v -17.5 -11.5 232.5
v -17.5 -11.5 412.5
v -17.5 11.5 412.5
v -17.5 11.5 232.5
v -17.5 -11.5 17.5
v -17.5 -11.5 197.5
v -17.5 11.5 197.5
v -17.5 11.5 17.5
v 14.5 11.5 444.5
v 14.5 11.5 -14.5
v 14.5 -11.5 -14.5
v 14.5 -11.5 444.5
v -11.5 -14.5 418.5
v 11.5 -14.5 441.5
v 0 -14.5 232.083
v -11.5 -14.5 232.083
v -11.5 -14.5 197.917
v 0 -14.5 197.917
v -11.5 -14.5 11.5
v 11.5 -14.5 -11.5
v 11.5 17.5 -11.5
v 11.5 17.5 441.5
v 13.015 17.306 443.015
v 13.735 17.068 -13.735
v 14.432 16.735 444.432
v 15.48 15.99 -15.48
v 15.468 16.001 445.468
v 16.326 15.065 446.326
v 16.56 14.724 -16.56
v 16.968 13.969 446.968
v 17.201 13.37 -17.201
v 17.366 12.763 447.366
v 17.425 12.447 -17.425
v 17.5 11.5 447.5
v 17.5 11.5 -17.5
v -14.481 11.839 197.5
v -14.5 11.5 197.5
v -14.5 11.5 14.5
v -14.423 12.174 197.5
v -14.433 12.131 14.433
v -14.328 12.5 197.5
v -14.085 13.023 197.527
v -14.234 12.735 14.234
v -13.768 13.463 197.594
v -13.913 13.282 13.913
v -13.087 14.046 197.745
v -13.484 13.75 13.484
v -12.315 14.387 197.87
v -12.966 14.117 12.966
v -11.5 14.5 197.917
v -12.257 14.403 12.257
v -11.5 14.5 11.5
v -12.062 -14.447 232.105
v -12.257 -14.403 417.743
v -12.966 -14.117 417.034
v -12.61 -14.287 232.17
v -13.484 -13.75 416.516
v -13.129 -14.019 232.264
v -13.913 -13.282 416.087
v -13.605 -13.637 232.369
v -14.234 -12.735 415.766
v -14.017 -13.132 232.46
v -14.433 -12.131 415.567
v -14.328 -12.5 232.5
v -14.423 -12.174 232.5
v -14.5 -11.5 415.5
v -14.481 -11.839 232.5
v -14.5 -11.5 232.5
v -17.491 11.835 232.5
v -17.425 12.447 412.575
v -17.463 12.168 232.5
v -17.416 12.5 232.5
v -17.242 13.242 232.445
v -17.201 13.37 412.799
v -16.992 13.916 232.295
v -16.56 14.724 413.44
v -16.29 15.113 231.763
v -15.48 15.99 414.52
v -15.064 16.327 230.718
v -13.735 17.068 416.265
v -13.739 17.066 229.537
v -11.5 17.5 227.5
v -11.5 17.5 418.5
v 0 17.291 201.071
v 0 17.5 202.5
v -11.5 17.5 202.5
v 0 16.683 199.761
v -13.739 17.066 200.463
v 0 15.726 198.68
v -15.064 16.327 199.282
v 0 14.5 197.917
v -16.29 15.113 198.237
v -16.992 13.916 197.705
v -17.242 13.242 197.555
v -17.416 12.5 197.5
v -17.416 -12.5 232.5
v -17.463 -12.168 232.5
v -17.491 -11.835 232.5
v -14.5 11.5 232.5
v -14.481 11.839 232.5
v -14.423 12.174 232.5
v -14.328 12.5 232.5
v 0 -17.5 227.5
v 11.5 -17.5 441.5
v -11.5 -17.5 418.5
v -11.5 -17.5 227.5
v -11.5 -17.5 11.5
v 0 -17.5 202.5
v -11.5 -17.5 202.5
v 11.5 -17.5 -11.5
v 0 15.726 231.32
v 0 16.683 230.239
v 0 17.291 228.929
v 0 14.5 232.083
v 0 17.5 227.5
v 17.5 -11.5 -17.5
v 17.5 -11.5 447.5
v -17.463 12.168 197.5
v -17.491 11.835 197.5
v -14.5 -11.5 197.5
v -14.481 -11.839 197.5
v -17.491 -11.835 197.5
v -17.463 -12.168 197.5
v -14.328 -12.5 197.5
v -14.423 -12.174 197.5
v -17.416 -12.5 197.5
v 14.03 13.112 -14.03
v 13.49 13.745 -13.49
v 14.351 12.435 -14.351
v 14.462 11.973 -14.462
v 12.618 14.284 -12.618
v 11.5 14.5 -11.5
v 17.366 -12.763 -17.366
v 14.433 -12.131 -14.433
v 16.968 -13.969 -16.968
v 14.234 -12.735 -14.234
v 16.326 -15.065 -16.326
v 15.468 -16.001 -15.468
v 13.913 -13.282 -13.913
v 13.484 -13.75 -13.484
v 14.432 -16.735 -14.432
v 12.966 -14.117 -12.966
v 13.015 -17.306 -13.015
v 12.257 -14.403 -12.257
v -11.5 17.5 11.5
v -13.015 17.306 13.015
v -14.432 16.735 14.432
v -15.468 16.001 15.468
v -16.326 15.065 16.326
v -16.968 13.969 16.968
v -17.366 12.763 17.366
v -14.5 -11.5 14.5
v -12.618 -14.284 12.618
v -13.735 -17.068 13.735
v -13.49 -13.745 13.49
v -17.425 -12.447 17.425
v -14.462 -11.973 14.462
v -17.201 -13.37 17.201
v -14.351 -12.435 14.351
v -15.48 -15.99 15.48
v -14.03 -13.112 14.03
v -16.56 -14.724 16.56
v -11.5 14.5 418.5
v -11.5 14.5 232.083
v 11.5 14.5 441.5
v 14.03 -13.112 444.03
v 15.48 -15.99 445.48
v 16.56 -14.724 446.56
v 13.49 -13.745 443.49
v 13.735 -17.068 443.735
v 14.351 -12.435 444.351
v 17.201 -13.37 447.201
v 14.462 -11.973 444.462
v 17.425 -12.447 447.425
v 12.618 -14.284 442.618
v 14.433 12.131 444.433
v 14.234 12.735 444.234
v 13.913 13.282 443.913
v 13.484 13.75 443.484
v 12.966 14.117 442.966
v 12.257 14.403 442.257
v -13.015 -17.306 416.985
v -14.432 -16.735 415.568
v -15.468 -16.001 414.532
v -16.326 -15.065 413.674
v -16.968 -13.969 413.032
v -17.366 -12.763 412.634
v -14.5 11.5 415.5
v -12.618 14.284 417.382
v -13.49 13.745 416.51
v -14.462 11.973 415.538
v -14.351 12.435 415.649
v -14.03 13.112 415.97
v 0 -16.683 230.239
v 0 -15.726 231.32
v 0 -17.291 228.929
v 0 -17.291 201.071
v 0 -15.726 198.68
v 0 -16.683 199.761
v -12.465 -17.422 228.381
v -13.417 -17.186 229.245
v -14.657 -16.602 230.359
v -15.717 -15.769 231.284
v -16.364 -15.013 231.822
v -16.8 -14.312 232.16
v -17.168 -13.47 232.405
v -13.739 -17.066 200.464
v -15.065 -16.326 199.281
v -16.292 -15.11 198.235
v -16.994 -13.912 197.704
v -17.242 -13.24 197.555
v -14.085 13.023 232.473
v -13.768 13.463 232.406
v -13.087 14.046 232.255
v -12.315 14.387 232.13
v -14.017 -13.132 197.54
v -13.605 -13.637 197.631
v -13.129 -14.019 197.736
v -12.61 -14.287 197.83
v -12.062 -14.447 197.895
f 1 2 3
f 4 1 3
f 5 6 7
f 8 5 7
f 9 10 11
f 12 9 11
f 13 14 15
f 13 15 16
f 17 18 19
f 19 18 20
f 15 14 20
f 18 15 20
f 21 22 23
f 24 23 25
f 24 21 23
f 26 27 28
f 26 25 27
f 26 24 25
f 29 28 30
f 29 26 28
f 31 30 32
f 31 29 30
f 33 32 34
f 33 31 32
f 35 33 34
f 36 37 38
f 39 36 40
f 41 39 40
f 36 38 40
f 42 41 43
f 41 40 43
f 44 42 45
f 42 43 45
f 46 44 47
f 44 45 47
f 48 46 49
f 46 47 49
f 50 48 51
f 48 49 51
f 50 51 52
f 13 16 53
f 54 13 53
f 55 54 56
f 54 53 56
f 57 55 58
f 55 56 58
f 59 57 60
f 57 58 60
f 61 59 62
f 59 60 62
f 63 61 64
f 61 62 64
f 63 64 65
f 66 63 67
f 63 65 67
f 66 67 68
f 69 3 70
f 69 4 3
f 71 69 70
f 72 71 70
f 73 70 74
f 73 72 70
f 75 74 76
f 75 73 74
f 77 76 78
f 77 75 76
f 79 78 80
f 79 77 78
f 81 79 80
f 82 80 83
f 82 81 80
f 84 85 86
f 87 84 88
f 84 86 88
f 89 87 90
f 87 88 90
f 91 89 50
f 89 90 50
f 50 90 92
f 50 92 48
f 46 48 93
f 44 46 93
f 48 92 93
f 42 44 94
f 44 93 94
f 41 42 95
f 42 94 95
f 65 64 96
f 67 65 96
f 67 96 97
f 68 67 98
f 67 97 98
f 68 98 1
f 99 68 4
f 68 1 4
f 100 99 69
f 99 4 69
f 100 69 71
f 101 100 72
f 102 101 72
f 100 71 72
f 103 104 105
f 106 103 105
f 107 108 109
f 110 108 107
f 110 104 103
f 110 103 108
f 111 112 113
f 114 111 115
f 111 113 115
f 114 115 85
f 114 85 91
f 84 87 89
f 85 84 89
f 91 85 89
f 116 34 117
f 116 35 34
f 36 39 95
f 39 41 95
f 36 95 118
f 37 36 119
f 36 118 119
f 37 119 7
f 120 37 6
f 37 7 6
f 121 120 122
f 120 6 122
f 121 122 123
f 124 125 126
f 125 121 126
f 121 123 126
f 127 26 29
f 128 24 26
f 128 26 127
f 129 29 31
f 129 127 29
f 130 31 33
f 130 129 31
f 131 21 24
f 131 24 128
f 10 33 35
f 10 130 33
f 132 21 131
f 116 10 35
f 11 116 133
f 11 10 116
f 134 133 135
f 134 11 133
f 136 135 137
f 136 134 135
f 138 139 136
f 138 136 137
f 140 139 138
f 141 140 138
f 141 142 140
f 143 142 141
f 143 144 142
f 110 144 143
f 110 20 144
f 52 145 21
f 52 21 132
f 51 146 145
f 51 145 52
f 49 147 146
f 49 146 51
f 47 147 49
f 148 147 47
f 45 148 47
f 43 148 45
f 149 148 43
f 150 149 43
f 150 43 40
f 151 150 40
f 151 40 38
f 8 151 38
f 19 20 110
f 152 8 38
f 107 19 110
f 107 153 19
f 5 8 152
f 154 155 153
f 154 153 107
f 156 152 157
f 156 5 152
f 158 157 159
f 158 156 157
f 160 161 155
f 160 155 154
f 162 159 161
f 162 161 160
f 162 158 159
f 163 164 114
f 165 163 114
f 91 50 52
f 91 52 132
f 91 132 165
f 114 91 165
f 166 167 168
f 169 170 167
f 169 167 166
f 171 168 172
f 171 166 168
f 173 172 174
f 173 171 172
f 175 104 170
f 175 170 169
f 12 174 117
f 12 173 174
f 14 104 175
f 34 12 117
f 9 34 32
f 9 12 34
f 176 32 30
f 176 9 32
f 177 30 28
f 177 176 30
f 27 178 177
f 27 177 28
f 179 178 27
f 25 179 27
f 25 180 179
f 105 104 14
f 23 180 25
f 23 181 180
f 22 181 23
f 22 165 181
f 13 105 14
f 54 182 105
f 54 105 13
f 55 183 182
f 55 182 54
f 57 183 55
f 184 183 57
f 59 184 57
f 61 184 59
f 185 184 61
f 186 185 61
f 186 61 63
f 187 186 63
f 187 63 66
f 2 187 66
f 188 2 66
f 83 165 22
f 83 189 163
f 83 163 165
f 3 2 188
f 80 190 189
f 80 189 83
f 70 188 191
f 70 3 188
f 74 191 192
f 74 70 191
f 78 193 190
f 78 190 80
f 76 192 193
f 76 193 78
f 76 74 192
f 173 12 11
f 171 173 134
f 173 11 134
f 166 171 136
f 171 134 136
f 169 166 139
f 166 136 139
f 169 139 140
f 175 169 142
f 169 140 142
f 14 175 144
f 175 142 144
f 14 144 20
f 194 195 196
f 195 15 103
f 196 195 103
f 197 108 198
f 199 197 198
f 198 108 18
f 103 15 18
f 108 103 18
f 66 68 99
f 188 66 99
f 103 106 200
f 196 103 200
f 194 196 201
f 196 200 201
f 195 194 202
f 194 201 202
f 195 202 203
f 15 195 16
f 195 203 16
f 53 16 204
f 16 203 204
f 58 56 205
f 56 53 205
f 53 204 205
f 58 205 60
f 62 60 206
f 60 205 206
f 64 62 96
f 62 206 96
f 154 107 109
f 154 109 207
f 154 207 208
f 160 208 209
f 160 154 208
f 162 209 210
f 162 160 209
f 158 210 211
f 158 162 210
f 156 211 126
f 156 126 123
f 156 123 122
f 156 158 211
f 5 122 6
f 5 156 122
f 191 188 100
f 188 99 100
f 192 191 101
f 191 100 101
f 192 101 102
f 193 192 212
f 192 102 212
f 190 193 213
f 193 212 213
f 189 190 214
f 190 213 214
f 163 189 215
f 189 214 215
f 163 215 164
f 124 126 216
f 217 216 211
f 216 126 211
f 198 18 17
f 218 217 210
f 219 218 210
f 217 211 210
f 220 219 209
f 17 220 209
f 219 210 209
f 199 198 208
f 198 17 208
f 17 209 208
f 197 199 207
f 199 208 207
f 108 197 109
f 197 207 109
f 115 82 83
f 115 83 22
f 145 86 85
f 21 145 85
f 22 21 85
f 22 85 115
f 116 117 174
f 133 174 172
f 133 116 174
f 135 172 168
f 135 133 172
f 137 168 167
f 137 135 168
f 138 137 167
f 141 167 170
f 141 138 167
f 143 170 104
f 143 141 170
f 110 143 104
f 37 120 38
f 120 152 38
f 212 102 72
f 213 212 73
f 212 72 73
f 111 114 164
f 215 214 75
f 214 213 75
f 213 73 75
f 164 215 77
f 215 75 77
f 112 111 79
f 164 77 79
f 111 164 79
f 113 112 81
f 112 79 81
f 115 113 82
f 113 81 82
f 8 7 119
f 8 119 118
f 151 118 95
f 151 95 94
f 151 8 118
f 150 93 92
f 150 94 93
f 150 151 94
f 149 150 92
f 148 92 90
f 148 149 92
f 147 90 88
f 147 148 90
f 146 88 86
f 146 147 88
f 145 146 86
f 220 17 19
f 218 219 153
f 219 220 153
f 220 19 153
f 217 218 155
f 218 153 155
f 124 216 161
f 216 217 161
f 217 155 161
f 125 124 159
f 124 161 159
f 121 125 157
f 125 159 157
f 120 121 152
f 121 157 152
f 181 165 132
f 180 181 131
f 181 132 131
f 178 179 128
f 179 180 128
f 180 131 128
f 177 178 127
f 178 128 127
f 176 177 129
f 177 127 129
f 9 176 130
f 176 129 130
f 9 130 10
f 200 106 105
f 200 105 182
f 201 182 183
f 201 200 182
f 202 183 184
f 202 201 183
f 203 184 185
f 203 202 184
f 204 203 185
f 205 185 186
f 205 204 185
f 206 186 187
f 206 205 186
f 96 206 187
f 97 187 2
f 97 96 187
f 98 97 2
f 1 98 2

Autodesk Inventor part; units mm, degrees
ref_plane "Start plane" through (0, 0, -17.5) normal (0, 0, 1) x (1, 0, 0)
ref_plane "End plane" through (0, 0, 447.5) normal (0, 0, 1) x (1, 0, 0)
sketch "Sketch" plane through (0, 0, 0) normal (0, 0, 1) x (1, 0, 0)
  line L0 (-17.5, -11.5) -> (-17.5, 11.5)
  line L1 (-11.5, 17.5) -> (11.5, 17.5)
  line L2 (17.5, 11.5) -> (17.5, -11.5)
  line L3 (11.5, -17.5) -> (-11.5, -17.5)
  arc A0 (-17.5, -11.5) -> (-11.5, -17.5) centre (-11.5, -11.5) ccw
  arc A1 (-11.5, 17.5) -> (-17.5, 11.5) centre (-11.5, 11.5) ccw
  arc A2 (17.5, 11.5) -> (11.5, 17.5) centre (11.5, 11.5) ccw
  arc A3 (11.5, -17.5) -> (17.5, -11.5) centre (11.5, -11.5) ccw
  arc A4 (-11.5, 14.5) -> (-14.5, 11.5) centre (-11.5, 11.5) ccw
  line L4 (-11.5, 14.5) -> (11.5, 14.5)
  arc A5 (14.5, 11.5) -> (11.5, 14.5) centre (11.5, 11.5) ccw
  line L5 (14.5, 11.5) -> (14.5, -11.5)
  arc A6 (11.5, -14.5) -> (14.5, -11.5) centre (11.5, -11.5) ccw
  line L6 (11.5, -14.5) -> (-11.5, -14.5)
  arc A7 (-14.5, -11.5) -> (-11.5, -14.5) centre (-11.5, -11.5) ccw
  line L7 (-14.5, -11.5) -> (-14.5, 11.5)
  line L8 (0, 25.4278) -> (0, -25.4278) construction
  line L9 (-25.4278, 0) -> (25.4278, 0) construction
  dimension "d7" = 6
  dimension "d10" = 35
  dimension "d11" = 35
  dimension "d12" = 3
  dimension "d15" = 17.5
  dimension "d16" = 17.5
extrude "Body" add sketch "Sketch" along normal up to surface (465 mm away) from surface at -17.5
sketch "Sketch3" plane through (0, 0, 0) normal (0, 0, 1) x (1, 0, 0)
  line L0 (0, 0) -> (10, 0)
ref_plane "Work Plane3" through (0, 0, 0) normal (0, -1, 0) x (1, 0, 0)
sketch "Sketch4" plane through (0, 0, 0) normal (0, -1, 0) x (1, 0, 0)
  line L0 (-2, -17.5) -> (12, -17.5)
  line L1 (-2, 447.5) -> (12, 447.5)
  dimension "d18" = 465
ref_plane "Work Plane4" through (17.5, 0, 447.5) normal (-0.7071, 0, 0.7071) x (0.7071, 0, 0.7071)
split "Split1" plane through (17.5, 0, 447.5) removes the side toward (-0.7071, 0, 0.7071)
ref_plane "Work Plane5" through (17.5, 0, -17.5) normal (-0.7071, 0, -0.7071) x (-0.7071, 0, 0.7071)
split "Split2" plane through (17.5, 0, -17.5) removes the side toward (-0.7071, 0, -0.7071)
ref_plane "Work Plane6" through (-730, 0, 215) normal (1, 0, 0) x (0, 0, -1)
ref_plane "Work Plane7" through (0, 0, 215) normal (1, 0, 0) x (0, 0, -1)
ref_plane "Work Plane8" through (-365, 0, 215) normal (1, 0, 0) x (0, 0, -1)
sketch "Sketch5" plane through (-365, 0, 215) normal (1, 0, 0) x (0, 0, -1)
  arc A0 (-17.5, -12.5) -> (-12.5, -17.5) centre (-12.5, -12.5) ccw
  line L0 (-17.5, -12.5) -> (-17.5, 12.5)
  arc A1 (-12.5, 17.5) -> (-17.5, 12.5) centre (-12.5, 12.5) ccw
  line L1 (-12.5, 17.5) -> (12.5, 17.5)
  arc A2 (17.5, 12.5) -> (12.5, 17.5) centre (12.5, 12.5) ccw
  line L2 (17.5, 12.5) -> (17.5, -12.5)
  arc A3 (12.5, -17.5) -> (17.5, -12.5) centre (12.5, -12.5) ccw
  line L3 (12.5, -17.5) -> (-12.5, -17.5)
  arc A4 (-12.5, 15) -> (-15, 12.5) centre (-12.5, 12.5) ccw
  line L4 (-12.5, 15) -> (12.5, 15)
  arc A5 (15, 12.5) -> (12.5, 15) centre (12.5, 12.5) ccw
  line L5 (15, 12.5) -> (15, -12.5)
  arc A6 (12.5, -15) -> (15, -12.5) centre (12.5, -12.5) ccw
  line L6 (12.5, -15) -> (-12.5, -15)
  arc A7 (-15, -12.5) -> (-12.5, -15) centre (-12.5, -12.5) ccw
  line L7 (-15, -12.5) -> (-15, 12.5)
extrude "Extrusion2" cut sketch "Sketch5" along normal up to surface (730 mm away) from surface at -365 contours L0 A1 L1 A2 L2 A3 L3 A0 | L4 A5 L5 A6 L6 A7 L7 A4
equation "\"d7\" = G_IR"
equation "\"d10\" = G_H"
equation "\"d11\" = G_W"
equation "\"d12\" = G_T"
equation "\"d15\" = 0.5 * d10"
equation "\"d16\" = 0.5 * d11"
equation "\"d3\" = G_L"
equation "\"G_W\" = 35"
equation "\"G_H\" = 35"
equation "\"G_T\" = 3"
equation "\"G_IR\" = 6"
equation "\"G_L\" = d18"
equation "\"G_OFFSET_START\" = 17.5"
equation "\"G_OFFSET_END\" = 17.5"
equation "\"d13\" = -G_OFFSET_START"
equation "\"d14\" = G_OFFSET_END + B_L"
equation "\"B_L\" = 430"
properties part number "AS 1163 - C350L0 35x35x3.0 SHS - 465" material "Steel, Mild"
